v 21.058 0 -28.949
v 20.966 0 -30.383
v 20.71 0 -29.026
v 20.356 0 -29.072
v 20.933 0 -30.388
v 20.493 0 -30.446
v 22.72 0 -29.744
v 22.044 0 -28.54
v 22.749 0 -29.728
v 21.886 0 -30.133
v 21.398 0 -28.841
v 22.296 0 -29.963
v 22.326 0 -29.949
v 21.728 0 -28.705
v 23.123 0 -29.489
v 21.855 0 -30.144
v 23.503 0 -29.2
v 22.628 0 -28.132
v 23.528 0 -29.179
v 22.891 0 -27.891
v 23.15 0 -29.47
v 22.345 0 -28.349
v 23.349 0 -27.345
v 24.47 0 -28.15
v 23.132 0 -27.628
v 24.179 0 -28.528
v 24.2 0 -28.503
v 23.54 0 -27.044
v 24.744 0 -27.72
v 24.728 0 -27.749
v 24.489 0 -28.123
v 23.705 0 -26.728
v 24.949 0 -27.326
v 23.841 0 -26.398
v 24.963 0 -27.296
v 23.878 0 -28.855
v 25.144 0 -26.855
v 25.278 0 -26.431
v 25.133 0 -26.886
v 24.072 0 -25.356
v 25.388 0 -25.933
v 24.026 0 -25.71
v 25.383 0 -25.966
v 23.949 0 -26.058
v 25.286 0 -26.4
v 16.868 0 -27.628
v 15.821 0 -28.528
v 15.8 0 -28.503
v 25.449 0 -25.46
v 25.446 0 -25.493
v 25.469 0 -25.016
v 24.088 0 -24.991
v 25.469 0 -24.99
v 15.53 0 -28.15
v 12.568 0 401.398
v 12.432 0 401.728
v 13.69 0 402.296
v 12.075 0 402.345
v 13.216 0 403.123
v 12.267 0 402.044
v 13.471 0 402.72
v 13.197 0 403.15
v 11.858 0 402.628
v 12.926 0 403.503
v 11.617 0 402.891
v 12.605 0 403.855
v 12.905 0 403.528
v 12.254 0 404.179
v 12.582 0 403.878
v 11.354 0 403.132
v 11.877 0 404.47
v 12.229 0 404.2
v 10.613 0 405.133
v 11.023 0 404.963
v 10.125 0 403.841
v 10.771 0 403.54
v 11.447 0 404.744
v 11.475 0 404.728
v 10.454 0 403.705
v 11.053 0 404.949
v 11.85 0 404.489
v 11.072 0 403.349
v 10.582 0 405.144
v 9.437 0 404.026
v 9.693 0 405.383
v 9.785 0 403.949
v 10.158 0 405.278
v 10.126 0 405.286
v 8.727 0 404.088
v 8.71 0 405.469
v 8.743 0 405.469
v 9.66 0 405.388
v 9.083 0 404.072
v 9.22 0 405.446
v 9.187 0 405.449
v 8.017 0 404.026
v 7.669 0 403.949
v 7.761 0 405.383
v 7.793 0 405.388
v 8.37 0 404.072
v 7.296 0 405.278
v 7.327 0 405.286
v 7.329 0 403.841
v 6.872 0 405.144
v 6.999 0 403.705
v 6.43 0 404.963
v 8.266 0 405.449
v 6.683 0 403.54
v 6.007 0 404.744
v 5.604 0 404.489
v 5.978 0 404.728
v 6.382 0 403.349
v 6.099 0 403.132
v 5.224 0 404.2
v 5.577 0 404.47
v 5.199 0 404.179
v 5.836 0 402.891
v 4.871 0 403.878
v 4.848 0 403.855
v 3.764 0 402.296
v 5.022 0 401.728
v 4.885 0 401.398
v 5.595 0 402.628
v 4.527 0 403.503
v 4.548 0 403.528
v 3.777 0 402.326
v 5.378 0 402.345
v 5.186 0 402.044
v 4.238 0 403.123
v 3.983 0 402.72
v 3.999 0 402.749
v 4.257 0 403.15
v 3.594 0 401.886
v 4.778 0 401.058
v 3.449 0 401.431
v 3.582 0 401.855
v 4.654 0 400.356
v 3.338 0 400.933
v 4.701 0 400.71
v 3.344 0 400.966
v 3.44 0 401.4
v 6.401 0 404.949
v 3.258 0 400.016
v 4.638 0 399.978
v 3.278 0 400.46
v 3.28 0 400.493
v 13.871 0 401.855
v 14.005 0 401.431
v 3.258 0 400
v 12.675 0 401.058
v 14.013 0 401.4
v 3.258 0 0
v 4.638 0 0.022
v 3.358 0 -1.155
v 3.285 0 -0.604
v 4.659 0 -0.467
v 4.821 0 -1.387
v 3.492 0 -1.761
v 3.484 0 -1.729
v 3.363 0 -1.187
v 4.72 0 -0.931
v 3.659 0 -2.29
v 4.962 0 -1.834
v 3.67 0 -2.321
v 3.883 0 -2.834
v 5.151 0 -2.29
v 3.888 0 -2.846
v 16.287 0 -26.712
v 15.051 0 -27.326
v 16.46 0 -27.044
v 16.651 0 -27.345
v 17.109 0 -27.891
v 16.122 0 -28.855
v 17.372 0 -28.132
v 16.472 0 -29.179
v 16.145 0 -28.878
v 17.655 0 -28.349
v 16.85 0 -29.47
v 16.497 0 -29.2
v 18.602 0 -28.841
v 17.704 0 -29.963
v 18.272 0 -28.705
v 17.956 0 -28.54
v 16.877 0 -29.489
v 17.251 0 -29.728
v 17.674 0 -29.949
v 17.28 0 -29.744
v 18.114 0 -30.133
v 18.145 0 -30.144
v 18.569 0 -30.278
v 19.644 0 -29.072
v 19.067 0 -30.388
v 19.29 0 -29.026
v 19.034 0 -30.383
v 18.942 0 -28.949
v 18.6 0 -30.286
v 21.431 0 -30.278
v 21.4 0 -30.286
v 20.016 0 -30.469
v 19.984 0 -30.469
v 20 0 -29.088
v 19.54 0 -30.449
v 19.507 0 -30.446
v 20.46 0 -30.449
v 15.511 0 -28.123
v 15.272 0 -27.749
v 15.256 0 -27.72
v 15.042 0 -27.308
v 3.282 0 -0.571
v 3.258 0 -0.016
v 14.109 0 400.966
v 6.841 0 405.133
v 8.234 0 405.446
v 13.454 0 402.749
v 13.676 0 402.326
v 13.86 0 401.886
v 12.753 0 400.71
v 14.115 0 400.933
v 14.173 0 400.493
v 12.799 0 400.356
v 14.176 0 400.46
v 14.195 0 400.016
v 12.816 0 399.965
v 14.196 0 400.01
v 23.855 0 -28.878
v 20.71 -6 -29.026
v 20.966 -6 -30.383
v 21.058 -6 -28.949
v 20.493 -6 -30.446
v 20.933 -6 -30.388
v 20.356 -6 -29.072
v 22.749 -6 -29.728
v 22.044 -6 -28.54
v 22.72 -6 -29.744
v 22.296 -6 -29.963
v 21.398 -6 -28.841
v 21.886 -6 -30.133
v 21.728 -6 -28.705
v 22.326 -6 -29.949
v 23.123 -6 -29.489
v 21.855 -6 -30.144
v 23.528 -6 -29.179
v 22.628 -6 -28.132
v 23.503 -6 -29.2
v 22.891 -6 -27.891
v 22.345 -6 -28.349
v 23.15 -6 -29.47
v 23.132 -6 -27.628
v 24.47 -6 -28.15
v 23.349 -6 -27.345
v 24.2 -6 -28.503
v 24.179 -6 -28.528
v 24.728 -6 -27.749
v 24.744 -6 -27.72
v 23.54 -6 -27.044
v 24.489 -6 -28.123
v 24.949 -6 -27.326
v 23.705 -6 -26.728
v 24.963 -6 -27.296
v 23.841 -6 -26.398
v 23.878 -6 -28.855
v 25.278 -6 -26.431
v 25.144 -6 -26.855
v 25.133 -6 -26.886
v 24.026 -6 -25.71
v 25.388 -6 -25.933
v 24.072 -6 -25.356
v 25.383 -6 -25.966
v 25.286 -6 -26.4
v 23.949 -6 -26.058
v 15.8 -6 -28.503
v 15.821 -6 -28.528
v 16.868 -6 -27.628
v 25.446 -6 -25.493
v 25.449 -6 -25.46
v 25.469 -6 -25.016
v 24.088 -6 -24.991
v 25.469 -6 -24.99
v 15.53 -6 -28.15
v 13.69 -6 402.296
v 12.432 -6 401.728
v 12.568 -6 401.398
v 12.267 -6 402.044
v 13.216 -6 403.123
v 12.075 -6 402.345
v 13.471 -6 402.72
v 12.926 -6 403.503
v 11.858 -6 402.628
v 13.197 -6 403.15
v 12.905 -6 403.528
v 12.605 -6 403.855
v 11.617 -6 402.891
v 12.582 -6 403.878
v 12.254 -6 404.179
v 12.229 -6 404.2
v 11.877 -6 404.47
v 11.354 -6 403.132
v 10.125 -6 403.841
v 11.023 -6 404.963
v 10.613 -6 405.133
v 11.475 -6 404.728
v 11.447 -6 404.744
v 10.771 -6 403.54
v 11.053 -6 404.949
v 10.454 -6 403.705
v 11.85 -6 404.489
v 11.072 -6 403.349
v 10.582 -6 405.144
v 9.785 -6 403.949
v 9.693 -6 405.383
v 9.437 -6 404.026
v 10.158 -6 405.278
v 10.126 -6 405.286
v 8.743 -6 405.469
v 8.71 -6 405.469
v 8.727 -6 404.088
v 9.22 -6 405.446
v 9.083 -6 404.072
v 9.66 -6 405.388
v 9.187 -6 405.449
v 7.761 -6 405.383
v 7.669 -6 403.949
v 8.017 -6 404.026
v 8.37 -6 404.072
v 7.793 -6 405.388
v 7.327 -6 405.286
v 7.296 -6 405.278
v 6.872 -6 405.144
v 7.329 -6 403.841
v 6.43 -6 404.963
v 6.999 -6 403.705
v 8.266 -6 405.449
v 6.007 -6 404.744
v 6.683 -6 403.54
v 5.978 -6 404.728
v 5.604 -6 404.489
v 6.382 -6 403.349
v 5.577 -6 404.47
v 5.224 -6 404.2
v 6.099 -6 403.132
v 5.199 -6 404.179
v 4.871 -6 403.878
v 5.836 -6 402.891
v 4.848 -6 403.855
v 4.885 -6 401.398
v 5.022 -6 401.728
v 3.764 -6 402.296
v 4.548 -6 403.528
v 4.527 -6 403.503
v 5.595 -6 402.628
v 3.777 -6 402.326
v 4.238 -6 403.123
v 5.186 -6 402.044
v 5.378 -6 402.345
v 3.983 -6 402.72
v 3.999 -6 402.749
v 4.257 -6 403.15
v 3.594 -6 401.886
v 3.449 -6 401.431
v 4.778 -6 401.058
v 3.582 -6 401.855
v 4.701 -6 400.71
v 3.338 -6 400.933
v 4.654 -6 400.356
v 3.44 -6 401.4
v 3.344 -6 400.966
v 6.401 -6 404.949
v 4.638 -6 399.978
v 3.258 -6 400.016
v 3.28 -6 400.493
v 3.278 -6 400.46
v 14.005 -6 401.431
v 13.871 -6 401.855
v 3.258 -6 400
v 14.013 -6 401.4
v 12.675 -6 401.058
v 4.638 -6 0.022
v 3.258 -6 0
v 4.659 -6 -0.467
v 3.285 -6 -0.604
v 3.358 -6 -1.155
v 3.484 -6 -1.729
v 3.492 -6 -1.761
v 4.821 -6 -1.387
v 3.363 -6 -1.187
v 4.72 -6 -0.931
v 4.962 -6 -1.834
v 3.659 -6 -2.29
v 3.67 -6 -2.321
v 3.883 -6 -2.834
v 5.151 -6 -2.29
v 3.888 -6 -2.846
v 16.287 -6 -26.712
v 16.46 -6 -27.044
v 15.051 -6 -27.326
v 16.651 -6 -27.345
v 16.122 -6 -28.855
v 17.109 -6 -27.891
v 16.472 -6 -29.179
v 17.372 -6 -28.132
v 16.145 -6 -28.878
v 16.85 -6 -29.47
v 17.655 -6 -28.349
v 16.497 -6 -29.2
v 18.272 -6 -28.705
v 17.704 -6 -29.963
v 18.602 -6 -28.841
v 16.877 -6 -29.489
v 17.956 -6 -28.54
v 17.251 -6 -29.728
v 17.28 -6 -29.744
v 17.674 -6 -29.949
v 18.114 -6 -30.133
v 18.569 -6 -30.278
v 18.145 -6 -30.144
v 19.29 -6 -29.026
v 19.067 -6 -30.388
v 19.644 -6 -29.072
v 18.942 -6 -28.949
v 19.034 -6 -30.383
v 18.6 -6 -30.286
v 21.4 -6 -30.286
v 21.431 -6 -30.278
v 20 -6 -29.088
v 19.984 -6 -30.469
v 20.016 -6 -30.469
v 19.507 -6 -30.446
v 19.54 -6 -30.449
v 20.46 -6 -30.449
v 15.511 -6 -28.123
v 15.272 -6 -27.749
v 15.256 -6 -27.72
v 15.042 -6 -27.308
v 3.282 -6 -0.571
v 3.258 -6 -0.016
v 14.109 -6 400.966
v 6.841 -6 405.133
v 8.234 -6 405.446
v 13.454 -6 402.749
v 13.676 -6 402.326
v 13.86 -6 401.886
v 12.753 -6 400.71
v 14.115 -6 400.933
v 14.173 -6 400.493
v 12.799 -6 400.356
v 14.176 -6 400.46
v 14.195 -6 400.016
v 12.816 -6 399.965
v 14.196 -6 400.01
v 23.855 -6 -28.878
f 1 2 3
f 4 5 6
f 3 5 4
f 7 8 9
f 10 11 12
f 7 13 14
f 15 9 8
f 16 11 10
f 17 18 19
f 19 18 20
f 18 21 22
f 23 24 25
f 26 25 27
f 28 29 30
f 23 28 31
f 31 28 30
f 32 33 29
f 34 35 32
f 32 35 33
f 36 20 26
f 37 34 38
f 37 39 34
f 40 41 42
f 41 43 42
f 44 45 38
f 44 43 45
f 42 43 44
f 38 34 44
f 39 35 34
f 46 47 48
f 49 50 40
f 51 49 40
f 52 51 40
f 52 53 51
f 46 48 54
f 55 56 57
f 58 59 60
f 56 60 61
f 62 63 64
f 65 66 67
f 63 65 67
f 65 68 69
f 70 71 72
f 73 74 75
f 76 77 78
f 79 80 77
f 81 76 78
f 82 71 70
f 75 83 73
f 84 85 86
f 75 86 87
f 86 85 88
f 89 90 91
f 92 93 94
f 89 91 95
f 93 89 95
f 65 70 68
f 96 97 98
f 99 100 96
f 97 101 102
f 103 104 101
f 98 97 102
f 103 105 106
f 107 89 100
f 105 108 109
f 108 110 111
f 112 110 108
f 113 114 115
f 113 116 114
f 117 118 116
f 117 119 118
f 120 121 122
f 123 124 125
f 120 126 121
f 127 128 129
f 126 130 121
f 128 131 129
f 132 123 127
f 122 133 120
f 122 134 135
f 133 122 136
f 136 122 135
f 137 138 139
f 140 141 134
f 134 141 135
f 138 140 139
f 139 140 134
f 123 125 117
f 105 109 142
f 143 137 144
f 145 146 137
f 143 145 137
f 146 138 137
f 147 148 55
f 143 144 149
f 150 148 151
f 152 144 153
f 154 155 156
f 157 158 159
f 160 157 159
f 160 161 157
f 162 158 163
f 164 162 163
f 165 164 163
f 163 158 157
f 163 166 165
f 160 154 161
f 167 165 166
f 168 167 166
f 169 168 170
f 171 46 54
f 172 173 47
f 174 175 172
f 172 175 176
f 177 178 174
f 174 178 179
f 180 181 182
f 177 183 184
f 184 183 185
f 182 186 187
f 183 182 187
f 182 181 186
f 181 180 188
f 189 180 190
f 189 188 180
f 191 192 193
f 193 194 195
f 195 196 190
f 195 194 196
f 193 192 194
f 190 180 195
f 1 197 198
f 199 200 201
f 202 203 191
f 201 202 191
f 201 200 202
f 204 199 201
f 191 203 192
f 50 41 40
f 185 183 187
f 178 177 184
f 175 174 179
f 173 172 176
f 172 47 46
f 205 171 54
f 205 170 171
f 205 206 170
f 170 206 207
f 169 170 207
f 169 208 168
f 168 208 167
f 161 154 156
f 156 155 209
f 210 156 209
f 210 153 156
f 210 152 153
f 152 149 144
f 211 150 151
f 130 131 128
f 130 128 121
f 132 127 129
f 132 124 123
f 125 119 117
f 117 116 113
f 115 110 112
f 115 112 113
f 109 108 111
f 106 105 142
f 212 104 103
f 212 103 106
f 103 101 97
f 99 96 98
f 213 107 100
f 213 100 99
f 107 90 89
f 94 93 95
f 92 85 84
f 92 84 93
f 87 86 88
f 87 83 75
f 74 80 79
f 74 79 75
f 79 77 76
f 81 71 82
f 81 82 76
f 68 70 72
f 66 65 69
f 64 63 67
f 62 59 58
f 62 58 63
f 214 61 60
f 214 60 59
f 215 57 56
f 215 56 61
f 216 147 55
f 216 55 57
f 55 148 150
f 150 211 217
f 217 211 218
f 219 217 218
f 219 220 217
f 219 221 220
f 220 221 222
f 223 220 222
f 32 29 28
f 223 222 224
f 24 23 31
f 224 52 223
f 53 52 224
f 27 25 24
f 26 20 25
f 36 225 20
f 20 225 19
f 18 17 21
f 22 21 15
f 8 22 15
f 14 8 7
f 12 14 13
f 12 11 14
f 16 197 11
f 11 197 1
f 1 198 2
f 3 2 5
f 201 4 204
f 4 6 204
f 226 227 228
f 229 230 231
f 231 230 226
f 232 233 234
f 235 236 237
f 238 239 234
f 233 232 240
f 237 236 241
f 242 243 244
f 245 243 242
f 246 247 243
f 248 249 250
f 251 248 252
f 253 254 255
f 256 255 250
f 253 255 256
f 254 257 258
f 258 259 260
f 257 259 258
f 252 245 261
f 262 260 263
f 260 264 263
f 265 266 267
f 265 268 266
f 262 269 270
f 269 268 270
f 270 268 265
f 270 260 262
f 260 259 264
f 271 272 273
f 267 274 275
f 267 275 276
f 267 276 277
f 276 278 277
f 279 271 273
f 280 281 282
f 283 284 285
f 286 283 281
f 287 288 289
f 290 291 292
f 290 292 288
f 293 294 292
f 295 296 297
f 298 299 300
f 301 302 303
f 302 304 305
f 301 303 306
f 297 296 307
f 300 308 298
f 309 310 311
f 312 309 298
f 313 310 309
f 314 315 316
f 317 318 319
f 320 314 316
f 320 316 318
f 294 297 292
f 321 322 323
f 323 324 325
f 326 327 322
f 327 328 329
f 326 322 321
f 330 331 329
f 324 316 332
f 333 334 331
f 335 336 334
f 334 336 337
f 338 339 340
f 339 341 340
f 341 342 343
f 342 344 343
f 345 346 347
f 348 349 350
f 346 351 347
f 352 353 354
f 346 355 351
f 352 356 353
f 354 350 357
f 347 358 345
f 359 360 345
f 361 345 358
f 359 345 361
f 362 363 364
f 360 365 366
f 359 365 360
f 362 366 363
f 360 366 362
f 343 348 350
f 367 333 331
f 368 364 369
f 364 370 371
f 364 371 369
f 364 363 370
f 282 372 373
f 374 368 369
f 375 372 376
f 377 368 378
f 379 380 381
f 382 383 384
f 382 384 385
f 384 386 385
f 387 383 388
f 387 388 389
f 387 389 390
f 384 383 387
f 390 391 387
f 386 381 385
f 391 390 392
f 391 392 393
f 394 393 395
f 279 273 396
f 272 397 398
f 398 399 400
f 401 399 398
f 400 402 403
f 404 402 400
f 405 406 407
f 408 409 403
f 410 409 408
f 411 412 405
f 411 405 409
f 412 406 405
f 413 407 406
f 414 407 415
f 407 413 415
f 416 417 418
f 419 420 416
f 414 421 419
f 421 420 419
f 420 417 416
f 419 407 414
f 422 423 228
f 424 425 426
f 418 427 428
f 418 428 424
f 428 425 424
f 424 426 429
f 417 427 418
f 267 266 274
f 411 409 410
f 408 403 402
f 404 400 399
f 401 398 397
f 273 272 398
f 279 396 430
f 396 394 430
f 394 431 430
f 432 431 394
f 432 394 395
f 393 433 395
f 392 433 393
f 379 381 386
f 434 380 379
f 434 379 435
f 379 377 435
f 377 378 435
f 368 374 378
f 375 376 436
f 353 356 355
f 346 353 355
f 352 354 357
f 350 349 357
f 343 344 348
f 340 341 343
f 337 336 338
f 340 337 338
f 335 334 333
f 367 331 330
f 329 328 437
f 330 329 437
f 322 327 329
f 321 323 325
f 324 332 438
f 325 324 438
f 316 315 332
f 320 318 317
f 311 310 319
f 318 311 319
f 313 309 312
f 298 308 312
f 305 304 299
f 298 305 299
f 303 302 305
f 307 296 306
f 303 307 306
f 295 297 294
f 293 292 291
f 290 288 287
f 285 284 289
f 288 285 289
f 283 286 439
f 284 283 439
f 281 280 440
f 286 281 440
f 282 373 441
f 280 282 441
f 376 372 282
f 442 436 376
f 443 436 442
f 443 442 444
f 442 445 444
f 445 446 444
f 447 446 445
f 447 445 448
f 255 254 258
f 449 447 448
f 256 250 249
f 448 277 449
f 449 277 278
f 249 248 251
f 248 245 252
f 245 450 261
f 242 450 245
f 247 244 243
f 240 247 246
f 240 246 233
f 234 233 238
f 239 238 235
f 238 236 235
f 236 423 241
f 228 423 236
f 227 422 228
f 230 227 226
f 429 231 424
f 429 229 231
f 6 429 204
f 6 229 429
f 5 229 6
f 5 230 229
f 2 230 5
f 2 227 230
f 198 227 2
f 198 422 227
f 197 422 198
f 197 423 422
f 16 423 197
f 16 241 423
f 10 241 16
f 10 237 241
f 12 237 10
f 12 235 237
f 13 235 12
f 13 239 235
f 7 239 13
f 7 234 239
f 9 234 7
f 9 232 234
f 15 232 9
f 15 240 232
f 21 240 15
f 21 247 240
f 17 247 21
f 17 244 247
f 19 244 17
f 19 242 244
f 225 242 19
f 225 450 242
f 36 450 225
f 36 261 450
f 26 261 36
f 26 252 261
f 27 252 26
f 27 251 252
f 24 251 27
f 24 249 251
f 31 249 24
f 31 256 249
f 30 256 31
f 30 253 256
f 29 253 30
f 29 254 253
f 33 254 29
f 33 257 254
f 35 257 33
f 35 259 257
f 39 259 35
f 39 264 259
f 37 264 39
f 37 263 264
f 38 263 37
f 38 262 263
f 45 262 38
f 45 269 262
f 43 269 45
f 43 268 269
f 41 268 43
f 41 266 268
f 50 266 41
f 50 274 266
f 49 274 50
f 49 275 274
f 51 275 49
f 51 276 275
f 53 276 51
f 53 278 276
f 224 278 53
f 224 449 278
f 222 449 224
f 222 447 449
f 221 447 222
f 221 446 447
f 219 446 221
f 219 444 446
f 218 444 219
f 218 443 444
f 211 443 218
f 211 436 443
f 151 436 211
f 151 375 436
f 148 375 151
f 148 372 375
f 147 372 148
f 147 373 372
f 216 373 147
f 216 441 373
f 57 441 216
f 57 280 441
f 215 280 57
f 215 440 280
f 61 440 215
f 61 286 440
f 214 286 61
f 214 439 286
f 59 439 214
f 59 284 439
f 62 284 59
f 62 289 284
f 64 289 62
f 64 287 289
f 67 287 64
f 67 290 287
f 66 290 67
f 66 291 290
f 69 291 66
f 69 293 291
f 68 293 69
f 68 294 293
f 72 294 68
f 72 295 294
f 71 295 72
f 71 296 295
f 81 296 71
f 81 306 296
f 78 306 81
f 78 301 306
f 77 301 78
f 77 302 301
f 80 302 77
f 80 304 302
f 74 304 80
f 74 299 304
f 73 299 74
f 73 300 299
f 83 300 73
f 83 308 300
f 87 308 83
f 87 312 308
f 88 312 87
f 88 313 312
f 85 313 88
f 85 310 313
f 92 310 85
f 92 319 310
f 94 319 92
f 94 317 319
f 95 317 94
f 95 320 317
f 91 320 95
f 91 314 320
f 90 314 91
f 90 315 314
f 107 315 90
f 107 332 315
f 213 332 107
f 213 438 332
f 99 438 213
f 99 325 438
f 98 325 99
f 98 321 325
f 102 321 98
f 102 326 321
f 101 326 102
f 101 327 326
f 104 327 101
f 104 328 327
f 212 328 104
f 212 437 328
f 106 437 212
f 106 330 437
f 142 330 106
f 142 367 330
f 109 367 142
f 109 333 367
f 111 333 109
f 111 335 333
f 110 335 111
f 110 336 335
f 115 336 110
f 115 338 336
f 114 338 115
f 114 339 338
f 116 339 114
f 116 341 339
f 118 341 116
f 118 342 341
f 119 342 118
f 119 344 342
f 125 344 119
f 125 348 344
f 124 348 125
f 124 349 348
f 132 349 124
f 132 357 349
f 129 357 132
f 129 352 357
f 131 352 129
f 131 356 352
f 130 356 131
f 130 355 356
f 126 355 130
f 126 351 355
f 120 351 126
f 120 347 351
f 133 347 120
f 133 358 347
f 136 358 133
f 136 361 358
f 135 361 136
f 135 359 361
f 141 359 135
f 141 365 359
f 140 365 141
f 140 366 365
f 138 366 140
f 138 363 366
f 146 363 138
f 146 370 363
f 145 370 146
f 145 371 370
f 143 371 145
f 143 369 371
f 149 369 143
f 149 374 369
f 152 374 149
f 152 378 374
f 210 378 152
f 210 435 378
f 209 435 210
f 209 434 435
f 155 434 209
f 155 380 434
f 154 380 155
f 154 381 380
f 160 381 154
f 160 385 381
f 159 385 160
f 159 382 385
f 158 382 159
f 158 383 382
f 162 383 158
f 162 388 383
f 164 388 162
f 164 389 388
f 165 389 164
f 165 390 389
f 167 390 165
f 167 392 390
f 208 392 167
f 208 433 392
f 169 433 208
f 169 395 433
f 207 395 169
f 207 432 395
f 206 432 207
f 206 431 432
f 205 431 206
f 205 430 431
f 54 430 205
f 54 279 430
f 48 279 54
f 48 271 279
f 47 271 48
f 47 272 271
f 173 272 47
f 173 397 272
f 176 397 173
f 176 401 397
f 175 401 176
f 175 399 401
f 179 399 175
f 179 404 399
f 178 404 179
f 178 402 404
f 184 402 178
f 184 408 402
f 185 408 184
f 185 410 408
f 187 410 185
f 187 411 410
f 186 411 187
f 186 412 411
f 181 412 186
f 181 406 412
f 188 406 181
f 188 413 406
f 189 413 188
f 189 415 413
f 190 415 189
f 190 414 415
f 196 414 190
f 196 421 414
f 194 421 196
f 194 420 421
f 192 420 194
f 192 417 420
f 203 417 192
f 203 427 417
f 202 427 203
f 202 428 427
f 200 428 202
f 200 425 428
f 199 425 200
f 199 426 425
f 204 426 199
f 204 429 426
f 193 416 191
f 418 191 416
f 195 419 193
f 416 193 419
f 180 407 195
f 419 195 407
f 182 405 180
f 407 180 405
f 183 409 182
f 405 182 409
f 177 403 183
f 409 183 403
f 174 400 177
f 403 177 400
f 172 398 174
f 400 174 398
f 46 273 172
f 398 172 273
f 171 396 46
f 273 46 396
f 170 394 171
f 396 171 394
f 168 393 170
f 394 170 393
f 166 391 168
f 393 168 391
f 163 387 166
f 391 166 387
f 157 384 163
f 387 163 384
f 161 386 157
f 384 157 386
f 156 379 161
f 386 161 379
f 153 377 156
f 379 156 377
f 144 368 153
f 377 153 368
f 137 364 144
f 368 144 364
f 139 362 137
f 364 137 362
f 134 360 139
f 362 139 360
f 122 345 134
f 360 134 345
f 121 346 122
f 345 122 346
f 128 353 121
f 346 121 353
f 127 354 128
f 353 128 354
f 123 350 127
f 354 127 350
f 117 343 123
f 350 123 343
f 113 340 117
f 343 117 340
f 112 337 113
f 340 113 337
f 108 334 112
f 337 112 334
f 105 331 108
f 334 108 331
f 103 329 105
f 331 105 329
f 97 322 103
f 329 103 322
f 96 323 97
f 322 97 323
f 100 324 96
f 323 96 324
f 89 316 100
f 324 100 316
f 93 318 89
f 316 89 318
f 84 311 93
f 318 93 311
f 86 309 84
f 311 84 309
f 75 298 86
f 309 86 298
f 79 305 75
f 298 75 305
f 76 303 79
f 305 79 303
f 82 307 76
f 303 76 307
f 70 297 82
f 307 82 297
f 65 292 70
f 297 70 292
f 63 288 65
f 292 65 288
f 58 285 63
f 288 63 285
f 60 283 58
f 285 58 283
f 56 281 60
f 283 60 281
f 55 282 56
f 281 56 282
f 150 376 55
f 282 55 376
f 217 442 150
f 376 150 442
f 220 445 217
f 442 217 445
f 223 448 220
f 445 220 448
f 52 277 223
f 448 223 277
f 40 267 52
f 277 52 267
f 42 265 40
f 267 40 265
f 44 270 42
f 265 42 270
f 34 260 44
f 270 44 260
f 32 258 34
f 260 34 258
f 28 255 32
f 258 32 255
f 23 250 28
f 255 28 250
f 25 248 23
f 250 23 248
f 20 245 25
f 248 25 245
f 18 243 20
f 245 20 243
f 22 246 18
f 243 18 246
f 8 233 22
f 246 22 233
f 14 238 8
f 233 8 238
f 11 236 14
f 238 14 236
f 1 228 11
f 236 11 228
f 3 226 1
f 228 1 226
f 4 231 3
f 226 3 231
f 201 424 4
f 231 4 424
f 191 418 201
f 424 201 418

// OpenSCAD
nteeth=16;
w=6;
l=400;
th=0.75;
bt=1.38;
pld=0.254;

module belt_pitch_path(nteeth=nteeth,l=l) hull() {
	translate([10,0])
	circle(d=40/PI);

	translate([20,-25])
	circle(d=2*nteeth/PI);

	translate([10+(nteeth-20)/PI,l])
	circle(d=2*nteeth/PI);
}

module belt_mockup(w=w,bt=bt,th=th,pld=pld) {
	rotate([90,0,0])
	linear_extrude(height=w,convexity=3)
	difference() {
		offset(r=bt-pld-th) children();
		offset(r=-pld-th) children();
	}
}

belt_mockup() belt_pitch_path();

$fs=.2;
$fa=5;
